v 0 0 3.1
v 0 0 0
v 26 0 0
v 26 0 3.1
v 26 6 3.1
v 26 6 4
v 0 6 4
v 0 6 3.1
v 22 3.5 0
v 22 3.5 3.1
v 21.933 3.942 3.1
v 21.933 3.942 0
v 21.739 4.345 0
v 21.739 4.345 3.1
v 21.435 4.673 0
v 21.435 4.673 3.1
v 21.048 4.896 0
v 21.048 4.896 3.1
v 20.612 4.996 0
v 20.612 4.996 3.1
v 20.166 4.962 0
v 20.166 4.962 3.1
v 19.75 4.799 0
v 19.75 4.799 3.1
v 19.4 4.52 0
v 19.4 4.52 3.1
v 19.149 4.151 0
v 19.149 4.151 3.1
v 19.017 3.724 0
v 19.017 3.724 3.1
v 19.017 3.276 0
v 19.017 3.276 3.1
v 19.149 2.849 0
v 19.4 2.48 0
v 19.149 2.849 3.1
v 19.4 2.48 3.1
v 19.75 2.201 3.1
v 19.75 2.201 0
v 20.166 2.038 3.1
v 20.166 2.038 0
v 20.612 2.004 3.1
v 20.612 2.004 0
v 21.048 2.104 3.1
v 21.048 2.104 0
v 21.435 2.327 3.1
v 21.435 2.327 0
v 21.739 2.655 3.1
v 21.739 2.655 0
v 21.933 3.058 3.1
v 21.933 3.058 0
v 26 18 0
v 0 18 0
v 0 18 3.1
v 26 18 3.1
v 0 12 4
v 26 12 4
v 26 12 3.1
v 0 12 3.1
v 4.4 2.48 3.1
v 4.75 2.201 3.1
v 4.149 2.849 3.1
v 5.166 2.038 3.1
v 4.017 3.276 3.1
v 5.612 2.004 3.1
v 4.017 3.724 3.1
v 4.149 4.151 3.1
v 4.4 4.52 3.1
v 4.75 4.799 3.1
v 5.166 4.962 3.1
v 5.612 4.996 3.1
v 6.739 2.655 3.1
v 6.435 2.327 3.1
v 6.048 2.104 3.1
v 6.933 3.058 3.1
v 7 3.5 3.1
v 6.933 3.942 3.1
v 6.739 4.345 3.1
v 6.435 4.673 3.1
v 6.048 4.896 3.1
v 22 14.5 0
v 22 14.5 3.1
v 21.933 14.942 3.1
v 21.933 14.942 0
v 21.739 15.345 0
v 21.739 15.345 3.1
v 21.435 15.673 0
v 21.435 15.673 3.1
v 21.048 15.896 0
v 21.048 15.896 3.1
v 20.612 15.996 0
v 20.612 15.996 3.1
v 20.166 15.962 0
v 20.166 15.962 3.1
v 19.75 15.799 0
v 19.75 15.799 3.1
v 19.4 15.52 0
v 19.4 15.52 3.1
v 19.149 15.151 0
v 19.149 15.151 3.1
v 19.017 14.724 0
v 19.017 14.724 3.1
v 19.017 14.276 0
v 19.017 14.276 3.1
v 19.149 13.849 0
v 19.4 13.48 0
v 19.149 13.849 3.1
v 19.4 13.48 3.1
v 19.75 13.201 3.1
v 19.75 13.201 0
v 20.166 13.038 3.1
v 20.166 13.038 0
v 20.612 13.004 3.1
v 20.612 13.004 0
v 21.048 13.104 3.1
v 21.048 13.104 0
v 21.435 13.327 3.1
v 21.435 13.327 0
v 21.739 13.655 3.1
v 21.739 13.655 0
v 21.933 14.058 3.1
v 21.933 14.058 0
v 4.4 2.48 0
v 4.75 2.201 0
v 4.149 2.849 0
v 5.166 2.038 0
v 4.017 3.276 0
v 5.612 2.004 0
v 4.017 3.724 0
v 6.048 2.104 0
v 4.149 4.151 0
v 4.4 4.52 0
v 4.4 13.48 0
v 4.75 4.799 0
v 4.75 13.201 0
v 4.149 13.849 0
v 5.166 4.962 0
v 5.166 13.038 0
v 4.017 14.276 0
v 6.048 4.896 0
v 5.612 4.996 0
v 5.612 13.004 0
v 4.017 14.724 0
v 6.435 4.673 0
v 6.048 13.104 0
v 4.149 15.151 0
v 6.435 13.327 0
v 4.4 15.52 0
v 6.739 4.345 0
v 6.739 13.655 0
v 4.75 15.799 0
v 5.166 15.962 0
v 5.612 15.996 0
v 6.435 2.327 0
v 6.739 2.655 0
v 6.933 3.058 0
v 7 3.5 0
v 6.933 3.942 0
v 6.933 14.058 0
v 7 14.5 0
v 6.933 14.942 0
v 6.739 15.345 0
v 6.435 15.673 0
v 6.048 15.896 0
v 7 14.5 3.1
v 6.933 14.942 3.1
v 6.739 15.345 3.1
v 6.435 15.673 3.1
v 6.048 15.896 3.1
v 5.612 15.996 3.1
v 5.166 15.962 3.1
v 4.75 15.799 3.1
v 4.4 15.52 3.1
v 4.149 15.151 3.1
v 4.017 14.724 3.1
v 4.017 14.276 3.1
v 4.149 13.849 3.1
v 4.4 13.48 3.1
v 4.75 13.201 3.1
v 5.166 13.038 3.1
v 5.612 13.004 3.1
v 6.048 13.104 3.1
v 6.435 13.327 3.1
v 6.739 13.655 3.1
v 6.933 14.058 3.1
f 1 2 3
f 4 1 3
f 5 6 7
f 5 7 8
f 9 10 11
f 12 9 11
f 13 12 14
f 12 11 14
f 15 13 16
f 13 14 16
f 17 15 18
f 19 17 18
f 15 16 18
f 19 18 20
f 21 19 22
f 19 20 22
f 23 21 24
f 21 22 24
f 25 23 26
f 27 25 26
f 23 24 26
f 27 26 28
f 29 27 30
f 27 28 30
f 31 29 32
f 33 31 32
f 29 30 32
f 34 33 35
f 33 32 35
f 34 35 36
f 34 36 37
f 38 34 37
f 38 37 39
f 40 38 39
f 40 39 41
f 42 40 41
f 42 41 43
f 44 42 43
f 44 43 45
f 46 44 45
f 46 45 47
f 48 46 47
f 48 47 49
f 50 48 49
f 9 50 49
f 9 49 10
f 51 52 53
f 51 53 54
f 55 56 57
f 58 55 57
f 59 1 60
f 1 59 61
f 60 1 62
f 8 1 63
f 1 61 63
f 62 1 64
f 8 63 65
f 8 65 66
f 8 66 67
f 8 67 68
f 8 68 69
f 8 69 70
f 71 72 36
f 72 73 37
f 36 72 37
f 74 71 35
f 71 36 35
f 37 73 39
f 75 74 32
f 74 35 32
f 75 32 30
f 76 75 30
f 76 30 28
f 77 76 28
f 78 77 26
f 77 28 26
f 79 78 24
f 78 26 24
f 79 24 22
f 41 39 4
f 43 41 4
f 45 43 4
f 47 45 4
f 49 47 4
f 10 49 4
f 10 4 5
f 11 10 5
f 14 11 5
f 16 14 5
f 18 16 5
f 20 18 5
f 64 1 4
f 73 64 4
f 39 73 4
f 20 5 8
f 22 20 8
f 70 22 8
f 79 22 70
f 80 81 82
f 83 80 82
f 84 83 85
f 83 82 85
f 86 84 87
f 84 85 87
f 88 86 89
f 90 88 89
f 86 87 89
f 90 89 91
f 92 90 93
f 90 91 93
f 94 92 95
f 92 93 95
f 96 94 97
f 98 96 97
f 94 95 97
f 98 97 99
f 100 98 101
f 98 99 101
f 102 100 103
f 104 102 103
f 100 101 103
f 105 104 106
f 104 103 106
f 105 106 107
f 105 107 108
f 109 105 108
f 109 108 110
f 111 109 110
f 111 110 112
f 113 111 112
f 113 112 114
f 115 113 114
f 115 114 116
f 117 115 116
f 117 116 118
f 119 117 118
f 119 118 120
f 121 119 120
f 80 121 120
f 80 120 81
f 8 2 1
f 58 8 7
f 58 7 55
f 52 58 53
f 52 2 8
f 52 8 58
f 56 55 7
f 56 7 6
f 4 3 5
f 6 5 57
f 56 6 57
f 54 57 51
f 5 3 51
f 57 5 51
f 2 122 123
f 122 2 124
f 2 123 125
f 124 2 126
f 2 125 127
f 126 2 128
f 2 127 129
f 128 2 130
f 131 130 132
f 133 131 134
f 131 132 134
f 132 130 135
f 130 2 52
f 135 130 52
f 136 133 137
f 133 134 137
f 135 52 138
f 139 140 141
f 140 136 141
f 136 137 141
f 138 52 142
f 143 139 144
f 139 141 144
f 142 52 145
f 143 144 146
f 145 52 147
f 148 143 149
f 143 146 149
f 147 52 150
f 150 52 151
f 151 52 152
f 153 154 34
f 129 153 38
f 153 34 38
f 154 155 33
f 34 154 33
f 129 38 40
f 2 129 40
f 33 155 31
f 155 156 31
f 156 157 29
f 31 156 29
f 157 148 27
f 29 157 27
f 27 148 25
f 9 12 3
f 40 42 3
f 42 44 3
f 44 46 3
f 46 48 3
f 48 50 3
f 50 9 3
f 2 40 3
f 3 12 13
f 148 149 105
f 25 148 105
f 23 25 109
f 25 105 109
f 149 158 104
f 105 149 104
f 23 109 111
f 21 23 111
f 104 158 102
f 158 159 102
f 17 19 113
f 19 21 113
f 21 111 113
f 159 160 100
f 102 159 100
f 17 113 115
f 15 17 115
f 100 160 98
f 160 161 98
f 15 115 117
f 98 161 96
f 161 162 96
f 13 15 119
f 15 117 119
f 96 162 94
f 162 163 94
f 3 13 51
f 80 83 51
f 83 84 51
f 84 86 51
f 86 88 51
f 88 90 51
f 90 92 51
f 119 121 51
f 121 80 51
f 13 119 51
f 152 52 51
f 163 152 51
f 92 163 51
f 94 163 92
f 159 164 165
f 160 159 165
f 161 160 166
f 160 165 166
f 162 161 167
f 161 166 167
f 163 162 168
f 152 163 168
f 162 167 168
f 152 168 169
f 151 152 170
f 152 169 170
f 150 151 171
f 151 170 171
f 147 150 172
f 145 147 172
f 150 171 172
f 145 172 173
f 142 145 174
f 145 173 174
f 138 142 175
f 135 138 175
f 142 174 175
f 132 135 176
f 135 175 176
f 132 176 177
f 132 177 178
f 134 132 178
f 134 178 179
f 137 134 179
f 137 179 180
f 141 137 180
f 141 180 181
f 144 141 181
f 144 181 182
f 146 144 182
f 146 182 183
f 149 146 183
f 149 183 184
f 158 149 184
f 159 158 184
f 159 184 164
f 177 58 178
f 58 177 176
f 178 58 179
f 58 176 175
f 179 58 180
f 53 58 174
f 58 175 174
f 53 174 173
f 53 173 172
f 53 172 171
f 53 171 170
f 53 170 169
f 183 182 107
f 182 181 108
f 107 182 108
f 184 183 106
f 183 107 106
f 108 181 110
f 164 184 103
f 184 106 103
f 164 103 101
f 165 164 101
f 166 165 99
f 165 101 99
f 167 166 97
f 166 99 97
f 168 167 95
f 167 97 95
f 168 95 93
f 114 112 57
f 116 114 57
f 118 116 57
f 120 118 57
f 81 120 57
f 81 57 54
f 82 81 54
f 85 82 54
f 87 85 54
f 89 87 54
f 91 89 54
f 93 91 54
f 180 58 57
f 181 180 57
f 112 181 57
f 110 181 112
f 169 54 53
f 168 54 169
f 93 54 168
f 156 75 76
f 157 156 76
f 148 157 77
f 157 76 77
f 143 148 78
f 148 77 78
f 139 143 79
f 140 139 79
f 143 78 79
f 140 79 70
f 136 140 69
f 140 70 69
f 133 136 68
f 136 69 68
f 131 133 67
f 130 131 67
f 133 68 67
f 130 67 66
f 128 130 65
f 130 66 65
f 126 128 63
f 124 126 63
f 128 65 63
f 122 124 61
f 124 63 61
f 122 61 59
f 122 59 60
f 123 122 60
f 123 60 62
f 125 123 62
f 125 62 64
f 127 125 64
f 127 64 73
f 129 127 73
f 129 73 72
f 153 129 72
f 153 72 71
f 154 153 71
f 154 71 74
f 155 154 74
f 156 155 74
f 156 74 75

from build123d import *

# Parameters (mm, degrees)
SKETCH_1_W          = 26
SKETCH_1_H          = 18
EXTRUDE_1_DEPTH     = 4
SKETCH_2_W          = 0.9
SKETCH_2_H          = 6
CUT_EXTRUDE_1_DEPTH = 27
SKETCH_3_R          = 1.5
CUT_EXTRUDE_2_DEPTH = 4


with BuildPart() as part:
    # 草图1 → 凸台-拉伸1 (new body)
    with BuildSketch(Plane.XY):
        with Locations((13, 9)):
            Rectangle(SKETCH_1_W, SKETCH_1_H)
    extrude(amount=EXTRUDE_1_DEPTH)

    # 草图2 → 切除-拉伸1 (cut, through all)
    with BuildSketch(Plane(origin=(26, 0, 0), x_dir=(0, 0, -1), z_dir=(1, 0, 0))):
        with Locations((-3.55, 3)):
            Rectangle(SKETCH_2_W, SKETCH_2_H)
        with Locations((-3.55, 15)):
            Rectangle(SKETCH_2_W, SKETCH_2_H)
    extrude(amount=-CUT_EXTRUDE_1_DEPTH, mode=Mode.SUBTRACT)

    # 草图3 → 切除-拉伸2 (cut)
    with BuildSketch(Plane.XY.offset(3.1)):
        with Locations((5.5, 14.5)):
            Circle(SKETCH_3_R)
        with Locations((5.5, 3.5)):
            Circle(SKETCH_3_R)
        with Locations((20.5, 3.5)):
            Circle(SKETCH_3_R)
        with Locations((20.5, 14.5)):
            Circle(SKETCH_3_R)
    extrude(amount=-CUT_EXTRUDE_2_DEPTH, mode=Mode.SUBTRACT)


solid = part.part
